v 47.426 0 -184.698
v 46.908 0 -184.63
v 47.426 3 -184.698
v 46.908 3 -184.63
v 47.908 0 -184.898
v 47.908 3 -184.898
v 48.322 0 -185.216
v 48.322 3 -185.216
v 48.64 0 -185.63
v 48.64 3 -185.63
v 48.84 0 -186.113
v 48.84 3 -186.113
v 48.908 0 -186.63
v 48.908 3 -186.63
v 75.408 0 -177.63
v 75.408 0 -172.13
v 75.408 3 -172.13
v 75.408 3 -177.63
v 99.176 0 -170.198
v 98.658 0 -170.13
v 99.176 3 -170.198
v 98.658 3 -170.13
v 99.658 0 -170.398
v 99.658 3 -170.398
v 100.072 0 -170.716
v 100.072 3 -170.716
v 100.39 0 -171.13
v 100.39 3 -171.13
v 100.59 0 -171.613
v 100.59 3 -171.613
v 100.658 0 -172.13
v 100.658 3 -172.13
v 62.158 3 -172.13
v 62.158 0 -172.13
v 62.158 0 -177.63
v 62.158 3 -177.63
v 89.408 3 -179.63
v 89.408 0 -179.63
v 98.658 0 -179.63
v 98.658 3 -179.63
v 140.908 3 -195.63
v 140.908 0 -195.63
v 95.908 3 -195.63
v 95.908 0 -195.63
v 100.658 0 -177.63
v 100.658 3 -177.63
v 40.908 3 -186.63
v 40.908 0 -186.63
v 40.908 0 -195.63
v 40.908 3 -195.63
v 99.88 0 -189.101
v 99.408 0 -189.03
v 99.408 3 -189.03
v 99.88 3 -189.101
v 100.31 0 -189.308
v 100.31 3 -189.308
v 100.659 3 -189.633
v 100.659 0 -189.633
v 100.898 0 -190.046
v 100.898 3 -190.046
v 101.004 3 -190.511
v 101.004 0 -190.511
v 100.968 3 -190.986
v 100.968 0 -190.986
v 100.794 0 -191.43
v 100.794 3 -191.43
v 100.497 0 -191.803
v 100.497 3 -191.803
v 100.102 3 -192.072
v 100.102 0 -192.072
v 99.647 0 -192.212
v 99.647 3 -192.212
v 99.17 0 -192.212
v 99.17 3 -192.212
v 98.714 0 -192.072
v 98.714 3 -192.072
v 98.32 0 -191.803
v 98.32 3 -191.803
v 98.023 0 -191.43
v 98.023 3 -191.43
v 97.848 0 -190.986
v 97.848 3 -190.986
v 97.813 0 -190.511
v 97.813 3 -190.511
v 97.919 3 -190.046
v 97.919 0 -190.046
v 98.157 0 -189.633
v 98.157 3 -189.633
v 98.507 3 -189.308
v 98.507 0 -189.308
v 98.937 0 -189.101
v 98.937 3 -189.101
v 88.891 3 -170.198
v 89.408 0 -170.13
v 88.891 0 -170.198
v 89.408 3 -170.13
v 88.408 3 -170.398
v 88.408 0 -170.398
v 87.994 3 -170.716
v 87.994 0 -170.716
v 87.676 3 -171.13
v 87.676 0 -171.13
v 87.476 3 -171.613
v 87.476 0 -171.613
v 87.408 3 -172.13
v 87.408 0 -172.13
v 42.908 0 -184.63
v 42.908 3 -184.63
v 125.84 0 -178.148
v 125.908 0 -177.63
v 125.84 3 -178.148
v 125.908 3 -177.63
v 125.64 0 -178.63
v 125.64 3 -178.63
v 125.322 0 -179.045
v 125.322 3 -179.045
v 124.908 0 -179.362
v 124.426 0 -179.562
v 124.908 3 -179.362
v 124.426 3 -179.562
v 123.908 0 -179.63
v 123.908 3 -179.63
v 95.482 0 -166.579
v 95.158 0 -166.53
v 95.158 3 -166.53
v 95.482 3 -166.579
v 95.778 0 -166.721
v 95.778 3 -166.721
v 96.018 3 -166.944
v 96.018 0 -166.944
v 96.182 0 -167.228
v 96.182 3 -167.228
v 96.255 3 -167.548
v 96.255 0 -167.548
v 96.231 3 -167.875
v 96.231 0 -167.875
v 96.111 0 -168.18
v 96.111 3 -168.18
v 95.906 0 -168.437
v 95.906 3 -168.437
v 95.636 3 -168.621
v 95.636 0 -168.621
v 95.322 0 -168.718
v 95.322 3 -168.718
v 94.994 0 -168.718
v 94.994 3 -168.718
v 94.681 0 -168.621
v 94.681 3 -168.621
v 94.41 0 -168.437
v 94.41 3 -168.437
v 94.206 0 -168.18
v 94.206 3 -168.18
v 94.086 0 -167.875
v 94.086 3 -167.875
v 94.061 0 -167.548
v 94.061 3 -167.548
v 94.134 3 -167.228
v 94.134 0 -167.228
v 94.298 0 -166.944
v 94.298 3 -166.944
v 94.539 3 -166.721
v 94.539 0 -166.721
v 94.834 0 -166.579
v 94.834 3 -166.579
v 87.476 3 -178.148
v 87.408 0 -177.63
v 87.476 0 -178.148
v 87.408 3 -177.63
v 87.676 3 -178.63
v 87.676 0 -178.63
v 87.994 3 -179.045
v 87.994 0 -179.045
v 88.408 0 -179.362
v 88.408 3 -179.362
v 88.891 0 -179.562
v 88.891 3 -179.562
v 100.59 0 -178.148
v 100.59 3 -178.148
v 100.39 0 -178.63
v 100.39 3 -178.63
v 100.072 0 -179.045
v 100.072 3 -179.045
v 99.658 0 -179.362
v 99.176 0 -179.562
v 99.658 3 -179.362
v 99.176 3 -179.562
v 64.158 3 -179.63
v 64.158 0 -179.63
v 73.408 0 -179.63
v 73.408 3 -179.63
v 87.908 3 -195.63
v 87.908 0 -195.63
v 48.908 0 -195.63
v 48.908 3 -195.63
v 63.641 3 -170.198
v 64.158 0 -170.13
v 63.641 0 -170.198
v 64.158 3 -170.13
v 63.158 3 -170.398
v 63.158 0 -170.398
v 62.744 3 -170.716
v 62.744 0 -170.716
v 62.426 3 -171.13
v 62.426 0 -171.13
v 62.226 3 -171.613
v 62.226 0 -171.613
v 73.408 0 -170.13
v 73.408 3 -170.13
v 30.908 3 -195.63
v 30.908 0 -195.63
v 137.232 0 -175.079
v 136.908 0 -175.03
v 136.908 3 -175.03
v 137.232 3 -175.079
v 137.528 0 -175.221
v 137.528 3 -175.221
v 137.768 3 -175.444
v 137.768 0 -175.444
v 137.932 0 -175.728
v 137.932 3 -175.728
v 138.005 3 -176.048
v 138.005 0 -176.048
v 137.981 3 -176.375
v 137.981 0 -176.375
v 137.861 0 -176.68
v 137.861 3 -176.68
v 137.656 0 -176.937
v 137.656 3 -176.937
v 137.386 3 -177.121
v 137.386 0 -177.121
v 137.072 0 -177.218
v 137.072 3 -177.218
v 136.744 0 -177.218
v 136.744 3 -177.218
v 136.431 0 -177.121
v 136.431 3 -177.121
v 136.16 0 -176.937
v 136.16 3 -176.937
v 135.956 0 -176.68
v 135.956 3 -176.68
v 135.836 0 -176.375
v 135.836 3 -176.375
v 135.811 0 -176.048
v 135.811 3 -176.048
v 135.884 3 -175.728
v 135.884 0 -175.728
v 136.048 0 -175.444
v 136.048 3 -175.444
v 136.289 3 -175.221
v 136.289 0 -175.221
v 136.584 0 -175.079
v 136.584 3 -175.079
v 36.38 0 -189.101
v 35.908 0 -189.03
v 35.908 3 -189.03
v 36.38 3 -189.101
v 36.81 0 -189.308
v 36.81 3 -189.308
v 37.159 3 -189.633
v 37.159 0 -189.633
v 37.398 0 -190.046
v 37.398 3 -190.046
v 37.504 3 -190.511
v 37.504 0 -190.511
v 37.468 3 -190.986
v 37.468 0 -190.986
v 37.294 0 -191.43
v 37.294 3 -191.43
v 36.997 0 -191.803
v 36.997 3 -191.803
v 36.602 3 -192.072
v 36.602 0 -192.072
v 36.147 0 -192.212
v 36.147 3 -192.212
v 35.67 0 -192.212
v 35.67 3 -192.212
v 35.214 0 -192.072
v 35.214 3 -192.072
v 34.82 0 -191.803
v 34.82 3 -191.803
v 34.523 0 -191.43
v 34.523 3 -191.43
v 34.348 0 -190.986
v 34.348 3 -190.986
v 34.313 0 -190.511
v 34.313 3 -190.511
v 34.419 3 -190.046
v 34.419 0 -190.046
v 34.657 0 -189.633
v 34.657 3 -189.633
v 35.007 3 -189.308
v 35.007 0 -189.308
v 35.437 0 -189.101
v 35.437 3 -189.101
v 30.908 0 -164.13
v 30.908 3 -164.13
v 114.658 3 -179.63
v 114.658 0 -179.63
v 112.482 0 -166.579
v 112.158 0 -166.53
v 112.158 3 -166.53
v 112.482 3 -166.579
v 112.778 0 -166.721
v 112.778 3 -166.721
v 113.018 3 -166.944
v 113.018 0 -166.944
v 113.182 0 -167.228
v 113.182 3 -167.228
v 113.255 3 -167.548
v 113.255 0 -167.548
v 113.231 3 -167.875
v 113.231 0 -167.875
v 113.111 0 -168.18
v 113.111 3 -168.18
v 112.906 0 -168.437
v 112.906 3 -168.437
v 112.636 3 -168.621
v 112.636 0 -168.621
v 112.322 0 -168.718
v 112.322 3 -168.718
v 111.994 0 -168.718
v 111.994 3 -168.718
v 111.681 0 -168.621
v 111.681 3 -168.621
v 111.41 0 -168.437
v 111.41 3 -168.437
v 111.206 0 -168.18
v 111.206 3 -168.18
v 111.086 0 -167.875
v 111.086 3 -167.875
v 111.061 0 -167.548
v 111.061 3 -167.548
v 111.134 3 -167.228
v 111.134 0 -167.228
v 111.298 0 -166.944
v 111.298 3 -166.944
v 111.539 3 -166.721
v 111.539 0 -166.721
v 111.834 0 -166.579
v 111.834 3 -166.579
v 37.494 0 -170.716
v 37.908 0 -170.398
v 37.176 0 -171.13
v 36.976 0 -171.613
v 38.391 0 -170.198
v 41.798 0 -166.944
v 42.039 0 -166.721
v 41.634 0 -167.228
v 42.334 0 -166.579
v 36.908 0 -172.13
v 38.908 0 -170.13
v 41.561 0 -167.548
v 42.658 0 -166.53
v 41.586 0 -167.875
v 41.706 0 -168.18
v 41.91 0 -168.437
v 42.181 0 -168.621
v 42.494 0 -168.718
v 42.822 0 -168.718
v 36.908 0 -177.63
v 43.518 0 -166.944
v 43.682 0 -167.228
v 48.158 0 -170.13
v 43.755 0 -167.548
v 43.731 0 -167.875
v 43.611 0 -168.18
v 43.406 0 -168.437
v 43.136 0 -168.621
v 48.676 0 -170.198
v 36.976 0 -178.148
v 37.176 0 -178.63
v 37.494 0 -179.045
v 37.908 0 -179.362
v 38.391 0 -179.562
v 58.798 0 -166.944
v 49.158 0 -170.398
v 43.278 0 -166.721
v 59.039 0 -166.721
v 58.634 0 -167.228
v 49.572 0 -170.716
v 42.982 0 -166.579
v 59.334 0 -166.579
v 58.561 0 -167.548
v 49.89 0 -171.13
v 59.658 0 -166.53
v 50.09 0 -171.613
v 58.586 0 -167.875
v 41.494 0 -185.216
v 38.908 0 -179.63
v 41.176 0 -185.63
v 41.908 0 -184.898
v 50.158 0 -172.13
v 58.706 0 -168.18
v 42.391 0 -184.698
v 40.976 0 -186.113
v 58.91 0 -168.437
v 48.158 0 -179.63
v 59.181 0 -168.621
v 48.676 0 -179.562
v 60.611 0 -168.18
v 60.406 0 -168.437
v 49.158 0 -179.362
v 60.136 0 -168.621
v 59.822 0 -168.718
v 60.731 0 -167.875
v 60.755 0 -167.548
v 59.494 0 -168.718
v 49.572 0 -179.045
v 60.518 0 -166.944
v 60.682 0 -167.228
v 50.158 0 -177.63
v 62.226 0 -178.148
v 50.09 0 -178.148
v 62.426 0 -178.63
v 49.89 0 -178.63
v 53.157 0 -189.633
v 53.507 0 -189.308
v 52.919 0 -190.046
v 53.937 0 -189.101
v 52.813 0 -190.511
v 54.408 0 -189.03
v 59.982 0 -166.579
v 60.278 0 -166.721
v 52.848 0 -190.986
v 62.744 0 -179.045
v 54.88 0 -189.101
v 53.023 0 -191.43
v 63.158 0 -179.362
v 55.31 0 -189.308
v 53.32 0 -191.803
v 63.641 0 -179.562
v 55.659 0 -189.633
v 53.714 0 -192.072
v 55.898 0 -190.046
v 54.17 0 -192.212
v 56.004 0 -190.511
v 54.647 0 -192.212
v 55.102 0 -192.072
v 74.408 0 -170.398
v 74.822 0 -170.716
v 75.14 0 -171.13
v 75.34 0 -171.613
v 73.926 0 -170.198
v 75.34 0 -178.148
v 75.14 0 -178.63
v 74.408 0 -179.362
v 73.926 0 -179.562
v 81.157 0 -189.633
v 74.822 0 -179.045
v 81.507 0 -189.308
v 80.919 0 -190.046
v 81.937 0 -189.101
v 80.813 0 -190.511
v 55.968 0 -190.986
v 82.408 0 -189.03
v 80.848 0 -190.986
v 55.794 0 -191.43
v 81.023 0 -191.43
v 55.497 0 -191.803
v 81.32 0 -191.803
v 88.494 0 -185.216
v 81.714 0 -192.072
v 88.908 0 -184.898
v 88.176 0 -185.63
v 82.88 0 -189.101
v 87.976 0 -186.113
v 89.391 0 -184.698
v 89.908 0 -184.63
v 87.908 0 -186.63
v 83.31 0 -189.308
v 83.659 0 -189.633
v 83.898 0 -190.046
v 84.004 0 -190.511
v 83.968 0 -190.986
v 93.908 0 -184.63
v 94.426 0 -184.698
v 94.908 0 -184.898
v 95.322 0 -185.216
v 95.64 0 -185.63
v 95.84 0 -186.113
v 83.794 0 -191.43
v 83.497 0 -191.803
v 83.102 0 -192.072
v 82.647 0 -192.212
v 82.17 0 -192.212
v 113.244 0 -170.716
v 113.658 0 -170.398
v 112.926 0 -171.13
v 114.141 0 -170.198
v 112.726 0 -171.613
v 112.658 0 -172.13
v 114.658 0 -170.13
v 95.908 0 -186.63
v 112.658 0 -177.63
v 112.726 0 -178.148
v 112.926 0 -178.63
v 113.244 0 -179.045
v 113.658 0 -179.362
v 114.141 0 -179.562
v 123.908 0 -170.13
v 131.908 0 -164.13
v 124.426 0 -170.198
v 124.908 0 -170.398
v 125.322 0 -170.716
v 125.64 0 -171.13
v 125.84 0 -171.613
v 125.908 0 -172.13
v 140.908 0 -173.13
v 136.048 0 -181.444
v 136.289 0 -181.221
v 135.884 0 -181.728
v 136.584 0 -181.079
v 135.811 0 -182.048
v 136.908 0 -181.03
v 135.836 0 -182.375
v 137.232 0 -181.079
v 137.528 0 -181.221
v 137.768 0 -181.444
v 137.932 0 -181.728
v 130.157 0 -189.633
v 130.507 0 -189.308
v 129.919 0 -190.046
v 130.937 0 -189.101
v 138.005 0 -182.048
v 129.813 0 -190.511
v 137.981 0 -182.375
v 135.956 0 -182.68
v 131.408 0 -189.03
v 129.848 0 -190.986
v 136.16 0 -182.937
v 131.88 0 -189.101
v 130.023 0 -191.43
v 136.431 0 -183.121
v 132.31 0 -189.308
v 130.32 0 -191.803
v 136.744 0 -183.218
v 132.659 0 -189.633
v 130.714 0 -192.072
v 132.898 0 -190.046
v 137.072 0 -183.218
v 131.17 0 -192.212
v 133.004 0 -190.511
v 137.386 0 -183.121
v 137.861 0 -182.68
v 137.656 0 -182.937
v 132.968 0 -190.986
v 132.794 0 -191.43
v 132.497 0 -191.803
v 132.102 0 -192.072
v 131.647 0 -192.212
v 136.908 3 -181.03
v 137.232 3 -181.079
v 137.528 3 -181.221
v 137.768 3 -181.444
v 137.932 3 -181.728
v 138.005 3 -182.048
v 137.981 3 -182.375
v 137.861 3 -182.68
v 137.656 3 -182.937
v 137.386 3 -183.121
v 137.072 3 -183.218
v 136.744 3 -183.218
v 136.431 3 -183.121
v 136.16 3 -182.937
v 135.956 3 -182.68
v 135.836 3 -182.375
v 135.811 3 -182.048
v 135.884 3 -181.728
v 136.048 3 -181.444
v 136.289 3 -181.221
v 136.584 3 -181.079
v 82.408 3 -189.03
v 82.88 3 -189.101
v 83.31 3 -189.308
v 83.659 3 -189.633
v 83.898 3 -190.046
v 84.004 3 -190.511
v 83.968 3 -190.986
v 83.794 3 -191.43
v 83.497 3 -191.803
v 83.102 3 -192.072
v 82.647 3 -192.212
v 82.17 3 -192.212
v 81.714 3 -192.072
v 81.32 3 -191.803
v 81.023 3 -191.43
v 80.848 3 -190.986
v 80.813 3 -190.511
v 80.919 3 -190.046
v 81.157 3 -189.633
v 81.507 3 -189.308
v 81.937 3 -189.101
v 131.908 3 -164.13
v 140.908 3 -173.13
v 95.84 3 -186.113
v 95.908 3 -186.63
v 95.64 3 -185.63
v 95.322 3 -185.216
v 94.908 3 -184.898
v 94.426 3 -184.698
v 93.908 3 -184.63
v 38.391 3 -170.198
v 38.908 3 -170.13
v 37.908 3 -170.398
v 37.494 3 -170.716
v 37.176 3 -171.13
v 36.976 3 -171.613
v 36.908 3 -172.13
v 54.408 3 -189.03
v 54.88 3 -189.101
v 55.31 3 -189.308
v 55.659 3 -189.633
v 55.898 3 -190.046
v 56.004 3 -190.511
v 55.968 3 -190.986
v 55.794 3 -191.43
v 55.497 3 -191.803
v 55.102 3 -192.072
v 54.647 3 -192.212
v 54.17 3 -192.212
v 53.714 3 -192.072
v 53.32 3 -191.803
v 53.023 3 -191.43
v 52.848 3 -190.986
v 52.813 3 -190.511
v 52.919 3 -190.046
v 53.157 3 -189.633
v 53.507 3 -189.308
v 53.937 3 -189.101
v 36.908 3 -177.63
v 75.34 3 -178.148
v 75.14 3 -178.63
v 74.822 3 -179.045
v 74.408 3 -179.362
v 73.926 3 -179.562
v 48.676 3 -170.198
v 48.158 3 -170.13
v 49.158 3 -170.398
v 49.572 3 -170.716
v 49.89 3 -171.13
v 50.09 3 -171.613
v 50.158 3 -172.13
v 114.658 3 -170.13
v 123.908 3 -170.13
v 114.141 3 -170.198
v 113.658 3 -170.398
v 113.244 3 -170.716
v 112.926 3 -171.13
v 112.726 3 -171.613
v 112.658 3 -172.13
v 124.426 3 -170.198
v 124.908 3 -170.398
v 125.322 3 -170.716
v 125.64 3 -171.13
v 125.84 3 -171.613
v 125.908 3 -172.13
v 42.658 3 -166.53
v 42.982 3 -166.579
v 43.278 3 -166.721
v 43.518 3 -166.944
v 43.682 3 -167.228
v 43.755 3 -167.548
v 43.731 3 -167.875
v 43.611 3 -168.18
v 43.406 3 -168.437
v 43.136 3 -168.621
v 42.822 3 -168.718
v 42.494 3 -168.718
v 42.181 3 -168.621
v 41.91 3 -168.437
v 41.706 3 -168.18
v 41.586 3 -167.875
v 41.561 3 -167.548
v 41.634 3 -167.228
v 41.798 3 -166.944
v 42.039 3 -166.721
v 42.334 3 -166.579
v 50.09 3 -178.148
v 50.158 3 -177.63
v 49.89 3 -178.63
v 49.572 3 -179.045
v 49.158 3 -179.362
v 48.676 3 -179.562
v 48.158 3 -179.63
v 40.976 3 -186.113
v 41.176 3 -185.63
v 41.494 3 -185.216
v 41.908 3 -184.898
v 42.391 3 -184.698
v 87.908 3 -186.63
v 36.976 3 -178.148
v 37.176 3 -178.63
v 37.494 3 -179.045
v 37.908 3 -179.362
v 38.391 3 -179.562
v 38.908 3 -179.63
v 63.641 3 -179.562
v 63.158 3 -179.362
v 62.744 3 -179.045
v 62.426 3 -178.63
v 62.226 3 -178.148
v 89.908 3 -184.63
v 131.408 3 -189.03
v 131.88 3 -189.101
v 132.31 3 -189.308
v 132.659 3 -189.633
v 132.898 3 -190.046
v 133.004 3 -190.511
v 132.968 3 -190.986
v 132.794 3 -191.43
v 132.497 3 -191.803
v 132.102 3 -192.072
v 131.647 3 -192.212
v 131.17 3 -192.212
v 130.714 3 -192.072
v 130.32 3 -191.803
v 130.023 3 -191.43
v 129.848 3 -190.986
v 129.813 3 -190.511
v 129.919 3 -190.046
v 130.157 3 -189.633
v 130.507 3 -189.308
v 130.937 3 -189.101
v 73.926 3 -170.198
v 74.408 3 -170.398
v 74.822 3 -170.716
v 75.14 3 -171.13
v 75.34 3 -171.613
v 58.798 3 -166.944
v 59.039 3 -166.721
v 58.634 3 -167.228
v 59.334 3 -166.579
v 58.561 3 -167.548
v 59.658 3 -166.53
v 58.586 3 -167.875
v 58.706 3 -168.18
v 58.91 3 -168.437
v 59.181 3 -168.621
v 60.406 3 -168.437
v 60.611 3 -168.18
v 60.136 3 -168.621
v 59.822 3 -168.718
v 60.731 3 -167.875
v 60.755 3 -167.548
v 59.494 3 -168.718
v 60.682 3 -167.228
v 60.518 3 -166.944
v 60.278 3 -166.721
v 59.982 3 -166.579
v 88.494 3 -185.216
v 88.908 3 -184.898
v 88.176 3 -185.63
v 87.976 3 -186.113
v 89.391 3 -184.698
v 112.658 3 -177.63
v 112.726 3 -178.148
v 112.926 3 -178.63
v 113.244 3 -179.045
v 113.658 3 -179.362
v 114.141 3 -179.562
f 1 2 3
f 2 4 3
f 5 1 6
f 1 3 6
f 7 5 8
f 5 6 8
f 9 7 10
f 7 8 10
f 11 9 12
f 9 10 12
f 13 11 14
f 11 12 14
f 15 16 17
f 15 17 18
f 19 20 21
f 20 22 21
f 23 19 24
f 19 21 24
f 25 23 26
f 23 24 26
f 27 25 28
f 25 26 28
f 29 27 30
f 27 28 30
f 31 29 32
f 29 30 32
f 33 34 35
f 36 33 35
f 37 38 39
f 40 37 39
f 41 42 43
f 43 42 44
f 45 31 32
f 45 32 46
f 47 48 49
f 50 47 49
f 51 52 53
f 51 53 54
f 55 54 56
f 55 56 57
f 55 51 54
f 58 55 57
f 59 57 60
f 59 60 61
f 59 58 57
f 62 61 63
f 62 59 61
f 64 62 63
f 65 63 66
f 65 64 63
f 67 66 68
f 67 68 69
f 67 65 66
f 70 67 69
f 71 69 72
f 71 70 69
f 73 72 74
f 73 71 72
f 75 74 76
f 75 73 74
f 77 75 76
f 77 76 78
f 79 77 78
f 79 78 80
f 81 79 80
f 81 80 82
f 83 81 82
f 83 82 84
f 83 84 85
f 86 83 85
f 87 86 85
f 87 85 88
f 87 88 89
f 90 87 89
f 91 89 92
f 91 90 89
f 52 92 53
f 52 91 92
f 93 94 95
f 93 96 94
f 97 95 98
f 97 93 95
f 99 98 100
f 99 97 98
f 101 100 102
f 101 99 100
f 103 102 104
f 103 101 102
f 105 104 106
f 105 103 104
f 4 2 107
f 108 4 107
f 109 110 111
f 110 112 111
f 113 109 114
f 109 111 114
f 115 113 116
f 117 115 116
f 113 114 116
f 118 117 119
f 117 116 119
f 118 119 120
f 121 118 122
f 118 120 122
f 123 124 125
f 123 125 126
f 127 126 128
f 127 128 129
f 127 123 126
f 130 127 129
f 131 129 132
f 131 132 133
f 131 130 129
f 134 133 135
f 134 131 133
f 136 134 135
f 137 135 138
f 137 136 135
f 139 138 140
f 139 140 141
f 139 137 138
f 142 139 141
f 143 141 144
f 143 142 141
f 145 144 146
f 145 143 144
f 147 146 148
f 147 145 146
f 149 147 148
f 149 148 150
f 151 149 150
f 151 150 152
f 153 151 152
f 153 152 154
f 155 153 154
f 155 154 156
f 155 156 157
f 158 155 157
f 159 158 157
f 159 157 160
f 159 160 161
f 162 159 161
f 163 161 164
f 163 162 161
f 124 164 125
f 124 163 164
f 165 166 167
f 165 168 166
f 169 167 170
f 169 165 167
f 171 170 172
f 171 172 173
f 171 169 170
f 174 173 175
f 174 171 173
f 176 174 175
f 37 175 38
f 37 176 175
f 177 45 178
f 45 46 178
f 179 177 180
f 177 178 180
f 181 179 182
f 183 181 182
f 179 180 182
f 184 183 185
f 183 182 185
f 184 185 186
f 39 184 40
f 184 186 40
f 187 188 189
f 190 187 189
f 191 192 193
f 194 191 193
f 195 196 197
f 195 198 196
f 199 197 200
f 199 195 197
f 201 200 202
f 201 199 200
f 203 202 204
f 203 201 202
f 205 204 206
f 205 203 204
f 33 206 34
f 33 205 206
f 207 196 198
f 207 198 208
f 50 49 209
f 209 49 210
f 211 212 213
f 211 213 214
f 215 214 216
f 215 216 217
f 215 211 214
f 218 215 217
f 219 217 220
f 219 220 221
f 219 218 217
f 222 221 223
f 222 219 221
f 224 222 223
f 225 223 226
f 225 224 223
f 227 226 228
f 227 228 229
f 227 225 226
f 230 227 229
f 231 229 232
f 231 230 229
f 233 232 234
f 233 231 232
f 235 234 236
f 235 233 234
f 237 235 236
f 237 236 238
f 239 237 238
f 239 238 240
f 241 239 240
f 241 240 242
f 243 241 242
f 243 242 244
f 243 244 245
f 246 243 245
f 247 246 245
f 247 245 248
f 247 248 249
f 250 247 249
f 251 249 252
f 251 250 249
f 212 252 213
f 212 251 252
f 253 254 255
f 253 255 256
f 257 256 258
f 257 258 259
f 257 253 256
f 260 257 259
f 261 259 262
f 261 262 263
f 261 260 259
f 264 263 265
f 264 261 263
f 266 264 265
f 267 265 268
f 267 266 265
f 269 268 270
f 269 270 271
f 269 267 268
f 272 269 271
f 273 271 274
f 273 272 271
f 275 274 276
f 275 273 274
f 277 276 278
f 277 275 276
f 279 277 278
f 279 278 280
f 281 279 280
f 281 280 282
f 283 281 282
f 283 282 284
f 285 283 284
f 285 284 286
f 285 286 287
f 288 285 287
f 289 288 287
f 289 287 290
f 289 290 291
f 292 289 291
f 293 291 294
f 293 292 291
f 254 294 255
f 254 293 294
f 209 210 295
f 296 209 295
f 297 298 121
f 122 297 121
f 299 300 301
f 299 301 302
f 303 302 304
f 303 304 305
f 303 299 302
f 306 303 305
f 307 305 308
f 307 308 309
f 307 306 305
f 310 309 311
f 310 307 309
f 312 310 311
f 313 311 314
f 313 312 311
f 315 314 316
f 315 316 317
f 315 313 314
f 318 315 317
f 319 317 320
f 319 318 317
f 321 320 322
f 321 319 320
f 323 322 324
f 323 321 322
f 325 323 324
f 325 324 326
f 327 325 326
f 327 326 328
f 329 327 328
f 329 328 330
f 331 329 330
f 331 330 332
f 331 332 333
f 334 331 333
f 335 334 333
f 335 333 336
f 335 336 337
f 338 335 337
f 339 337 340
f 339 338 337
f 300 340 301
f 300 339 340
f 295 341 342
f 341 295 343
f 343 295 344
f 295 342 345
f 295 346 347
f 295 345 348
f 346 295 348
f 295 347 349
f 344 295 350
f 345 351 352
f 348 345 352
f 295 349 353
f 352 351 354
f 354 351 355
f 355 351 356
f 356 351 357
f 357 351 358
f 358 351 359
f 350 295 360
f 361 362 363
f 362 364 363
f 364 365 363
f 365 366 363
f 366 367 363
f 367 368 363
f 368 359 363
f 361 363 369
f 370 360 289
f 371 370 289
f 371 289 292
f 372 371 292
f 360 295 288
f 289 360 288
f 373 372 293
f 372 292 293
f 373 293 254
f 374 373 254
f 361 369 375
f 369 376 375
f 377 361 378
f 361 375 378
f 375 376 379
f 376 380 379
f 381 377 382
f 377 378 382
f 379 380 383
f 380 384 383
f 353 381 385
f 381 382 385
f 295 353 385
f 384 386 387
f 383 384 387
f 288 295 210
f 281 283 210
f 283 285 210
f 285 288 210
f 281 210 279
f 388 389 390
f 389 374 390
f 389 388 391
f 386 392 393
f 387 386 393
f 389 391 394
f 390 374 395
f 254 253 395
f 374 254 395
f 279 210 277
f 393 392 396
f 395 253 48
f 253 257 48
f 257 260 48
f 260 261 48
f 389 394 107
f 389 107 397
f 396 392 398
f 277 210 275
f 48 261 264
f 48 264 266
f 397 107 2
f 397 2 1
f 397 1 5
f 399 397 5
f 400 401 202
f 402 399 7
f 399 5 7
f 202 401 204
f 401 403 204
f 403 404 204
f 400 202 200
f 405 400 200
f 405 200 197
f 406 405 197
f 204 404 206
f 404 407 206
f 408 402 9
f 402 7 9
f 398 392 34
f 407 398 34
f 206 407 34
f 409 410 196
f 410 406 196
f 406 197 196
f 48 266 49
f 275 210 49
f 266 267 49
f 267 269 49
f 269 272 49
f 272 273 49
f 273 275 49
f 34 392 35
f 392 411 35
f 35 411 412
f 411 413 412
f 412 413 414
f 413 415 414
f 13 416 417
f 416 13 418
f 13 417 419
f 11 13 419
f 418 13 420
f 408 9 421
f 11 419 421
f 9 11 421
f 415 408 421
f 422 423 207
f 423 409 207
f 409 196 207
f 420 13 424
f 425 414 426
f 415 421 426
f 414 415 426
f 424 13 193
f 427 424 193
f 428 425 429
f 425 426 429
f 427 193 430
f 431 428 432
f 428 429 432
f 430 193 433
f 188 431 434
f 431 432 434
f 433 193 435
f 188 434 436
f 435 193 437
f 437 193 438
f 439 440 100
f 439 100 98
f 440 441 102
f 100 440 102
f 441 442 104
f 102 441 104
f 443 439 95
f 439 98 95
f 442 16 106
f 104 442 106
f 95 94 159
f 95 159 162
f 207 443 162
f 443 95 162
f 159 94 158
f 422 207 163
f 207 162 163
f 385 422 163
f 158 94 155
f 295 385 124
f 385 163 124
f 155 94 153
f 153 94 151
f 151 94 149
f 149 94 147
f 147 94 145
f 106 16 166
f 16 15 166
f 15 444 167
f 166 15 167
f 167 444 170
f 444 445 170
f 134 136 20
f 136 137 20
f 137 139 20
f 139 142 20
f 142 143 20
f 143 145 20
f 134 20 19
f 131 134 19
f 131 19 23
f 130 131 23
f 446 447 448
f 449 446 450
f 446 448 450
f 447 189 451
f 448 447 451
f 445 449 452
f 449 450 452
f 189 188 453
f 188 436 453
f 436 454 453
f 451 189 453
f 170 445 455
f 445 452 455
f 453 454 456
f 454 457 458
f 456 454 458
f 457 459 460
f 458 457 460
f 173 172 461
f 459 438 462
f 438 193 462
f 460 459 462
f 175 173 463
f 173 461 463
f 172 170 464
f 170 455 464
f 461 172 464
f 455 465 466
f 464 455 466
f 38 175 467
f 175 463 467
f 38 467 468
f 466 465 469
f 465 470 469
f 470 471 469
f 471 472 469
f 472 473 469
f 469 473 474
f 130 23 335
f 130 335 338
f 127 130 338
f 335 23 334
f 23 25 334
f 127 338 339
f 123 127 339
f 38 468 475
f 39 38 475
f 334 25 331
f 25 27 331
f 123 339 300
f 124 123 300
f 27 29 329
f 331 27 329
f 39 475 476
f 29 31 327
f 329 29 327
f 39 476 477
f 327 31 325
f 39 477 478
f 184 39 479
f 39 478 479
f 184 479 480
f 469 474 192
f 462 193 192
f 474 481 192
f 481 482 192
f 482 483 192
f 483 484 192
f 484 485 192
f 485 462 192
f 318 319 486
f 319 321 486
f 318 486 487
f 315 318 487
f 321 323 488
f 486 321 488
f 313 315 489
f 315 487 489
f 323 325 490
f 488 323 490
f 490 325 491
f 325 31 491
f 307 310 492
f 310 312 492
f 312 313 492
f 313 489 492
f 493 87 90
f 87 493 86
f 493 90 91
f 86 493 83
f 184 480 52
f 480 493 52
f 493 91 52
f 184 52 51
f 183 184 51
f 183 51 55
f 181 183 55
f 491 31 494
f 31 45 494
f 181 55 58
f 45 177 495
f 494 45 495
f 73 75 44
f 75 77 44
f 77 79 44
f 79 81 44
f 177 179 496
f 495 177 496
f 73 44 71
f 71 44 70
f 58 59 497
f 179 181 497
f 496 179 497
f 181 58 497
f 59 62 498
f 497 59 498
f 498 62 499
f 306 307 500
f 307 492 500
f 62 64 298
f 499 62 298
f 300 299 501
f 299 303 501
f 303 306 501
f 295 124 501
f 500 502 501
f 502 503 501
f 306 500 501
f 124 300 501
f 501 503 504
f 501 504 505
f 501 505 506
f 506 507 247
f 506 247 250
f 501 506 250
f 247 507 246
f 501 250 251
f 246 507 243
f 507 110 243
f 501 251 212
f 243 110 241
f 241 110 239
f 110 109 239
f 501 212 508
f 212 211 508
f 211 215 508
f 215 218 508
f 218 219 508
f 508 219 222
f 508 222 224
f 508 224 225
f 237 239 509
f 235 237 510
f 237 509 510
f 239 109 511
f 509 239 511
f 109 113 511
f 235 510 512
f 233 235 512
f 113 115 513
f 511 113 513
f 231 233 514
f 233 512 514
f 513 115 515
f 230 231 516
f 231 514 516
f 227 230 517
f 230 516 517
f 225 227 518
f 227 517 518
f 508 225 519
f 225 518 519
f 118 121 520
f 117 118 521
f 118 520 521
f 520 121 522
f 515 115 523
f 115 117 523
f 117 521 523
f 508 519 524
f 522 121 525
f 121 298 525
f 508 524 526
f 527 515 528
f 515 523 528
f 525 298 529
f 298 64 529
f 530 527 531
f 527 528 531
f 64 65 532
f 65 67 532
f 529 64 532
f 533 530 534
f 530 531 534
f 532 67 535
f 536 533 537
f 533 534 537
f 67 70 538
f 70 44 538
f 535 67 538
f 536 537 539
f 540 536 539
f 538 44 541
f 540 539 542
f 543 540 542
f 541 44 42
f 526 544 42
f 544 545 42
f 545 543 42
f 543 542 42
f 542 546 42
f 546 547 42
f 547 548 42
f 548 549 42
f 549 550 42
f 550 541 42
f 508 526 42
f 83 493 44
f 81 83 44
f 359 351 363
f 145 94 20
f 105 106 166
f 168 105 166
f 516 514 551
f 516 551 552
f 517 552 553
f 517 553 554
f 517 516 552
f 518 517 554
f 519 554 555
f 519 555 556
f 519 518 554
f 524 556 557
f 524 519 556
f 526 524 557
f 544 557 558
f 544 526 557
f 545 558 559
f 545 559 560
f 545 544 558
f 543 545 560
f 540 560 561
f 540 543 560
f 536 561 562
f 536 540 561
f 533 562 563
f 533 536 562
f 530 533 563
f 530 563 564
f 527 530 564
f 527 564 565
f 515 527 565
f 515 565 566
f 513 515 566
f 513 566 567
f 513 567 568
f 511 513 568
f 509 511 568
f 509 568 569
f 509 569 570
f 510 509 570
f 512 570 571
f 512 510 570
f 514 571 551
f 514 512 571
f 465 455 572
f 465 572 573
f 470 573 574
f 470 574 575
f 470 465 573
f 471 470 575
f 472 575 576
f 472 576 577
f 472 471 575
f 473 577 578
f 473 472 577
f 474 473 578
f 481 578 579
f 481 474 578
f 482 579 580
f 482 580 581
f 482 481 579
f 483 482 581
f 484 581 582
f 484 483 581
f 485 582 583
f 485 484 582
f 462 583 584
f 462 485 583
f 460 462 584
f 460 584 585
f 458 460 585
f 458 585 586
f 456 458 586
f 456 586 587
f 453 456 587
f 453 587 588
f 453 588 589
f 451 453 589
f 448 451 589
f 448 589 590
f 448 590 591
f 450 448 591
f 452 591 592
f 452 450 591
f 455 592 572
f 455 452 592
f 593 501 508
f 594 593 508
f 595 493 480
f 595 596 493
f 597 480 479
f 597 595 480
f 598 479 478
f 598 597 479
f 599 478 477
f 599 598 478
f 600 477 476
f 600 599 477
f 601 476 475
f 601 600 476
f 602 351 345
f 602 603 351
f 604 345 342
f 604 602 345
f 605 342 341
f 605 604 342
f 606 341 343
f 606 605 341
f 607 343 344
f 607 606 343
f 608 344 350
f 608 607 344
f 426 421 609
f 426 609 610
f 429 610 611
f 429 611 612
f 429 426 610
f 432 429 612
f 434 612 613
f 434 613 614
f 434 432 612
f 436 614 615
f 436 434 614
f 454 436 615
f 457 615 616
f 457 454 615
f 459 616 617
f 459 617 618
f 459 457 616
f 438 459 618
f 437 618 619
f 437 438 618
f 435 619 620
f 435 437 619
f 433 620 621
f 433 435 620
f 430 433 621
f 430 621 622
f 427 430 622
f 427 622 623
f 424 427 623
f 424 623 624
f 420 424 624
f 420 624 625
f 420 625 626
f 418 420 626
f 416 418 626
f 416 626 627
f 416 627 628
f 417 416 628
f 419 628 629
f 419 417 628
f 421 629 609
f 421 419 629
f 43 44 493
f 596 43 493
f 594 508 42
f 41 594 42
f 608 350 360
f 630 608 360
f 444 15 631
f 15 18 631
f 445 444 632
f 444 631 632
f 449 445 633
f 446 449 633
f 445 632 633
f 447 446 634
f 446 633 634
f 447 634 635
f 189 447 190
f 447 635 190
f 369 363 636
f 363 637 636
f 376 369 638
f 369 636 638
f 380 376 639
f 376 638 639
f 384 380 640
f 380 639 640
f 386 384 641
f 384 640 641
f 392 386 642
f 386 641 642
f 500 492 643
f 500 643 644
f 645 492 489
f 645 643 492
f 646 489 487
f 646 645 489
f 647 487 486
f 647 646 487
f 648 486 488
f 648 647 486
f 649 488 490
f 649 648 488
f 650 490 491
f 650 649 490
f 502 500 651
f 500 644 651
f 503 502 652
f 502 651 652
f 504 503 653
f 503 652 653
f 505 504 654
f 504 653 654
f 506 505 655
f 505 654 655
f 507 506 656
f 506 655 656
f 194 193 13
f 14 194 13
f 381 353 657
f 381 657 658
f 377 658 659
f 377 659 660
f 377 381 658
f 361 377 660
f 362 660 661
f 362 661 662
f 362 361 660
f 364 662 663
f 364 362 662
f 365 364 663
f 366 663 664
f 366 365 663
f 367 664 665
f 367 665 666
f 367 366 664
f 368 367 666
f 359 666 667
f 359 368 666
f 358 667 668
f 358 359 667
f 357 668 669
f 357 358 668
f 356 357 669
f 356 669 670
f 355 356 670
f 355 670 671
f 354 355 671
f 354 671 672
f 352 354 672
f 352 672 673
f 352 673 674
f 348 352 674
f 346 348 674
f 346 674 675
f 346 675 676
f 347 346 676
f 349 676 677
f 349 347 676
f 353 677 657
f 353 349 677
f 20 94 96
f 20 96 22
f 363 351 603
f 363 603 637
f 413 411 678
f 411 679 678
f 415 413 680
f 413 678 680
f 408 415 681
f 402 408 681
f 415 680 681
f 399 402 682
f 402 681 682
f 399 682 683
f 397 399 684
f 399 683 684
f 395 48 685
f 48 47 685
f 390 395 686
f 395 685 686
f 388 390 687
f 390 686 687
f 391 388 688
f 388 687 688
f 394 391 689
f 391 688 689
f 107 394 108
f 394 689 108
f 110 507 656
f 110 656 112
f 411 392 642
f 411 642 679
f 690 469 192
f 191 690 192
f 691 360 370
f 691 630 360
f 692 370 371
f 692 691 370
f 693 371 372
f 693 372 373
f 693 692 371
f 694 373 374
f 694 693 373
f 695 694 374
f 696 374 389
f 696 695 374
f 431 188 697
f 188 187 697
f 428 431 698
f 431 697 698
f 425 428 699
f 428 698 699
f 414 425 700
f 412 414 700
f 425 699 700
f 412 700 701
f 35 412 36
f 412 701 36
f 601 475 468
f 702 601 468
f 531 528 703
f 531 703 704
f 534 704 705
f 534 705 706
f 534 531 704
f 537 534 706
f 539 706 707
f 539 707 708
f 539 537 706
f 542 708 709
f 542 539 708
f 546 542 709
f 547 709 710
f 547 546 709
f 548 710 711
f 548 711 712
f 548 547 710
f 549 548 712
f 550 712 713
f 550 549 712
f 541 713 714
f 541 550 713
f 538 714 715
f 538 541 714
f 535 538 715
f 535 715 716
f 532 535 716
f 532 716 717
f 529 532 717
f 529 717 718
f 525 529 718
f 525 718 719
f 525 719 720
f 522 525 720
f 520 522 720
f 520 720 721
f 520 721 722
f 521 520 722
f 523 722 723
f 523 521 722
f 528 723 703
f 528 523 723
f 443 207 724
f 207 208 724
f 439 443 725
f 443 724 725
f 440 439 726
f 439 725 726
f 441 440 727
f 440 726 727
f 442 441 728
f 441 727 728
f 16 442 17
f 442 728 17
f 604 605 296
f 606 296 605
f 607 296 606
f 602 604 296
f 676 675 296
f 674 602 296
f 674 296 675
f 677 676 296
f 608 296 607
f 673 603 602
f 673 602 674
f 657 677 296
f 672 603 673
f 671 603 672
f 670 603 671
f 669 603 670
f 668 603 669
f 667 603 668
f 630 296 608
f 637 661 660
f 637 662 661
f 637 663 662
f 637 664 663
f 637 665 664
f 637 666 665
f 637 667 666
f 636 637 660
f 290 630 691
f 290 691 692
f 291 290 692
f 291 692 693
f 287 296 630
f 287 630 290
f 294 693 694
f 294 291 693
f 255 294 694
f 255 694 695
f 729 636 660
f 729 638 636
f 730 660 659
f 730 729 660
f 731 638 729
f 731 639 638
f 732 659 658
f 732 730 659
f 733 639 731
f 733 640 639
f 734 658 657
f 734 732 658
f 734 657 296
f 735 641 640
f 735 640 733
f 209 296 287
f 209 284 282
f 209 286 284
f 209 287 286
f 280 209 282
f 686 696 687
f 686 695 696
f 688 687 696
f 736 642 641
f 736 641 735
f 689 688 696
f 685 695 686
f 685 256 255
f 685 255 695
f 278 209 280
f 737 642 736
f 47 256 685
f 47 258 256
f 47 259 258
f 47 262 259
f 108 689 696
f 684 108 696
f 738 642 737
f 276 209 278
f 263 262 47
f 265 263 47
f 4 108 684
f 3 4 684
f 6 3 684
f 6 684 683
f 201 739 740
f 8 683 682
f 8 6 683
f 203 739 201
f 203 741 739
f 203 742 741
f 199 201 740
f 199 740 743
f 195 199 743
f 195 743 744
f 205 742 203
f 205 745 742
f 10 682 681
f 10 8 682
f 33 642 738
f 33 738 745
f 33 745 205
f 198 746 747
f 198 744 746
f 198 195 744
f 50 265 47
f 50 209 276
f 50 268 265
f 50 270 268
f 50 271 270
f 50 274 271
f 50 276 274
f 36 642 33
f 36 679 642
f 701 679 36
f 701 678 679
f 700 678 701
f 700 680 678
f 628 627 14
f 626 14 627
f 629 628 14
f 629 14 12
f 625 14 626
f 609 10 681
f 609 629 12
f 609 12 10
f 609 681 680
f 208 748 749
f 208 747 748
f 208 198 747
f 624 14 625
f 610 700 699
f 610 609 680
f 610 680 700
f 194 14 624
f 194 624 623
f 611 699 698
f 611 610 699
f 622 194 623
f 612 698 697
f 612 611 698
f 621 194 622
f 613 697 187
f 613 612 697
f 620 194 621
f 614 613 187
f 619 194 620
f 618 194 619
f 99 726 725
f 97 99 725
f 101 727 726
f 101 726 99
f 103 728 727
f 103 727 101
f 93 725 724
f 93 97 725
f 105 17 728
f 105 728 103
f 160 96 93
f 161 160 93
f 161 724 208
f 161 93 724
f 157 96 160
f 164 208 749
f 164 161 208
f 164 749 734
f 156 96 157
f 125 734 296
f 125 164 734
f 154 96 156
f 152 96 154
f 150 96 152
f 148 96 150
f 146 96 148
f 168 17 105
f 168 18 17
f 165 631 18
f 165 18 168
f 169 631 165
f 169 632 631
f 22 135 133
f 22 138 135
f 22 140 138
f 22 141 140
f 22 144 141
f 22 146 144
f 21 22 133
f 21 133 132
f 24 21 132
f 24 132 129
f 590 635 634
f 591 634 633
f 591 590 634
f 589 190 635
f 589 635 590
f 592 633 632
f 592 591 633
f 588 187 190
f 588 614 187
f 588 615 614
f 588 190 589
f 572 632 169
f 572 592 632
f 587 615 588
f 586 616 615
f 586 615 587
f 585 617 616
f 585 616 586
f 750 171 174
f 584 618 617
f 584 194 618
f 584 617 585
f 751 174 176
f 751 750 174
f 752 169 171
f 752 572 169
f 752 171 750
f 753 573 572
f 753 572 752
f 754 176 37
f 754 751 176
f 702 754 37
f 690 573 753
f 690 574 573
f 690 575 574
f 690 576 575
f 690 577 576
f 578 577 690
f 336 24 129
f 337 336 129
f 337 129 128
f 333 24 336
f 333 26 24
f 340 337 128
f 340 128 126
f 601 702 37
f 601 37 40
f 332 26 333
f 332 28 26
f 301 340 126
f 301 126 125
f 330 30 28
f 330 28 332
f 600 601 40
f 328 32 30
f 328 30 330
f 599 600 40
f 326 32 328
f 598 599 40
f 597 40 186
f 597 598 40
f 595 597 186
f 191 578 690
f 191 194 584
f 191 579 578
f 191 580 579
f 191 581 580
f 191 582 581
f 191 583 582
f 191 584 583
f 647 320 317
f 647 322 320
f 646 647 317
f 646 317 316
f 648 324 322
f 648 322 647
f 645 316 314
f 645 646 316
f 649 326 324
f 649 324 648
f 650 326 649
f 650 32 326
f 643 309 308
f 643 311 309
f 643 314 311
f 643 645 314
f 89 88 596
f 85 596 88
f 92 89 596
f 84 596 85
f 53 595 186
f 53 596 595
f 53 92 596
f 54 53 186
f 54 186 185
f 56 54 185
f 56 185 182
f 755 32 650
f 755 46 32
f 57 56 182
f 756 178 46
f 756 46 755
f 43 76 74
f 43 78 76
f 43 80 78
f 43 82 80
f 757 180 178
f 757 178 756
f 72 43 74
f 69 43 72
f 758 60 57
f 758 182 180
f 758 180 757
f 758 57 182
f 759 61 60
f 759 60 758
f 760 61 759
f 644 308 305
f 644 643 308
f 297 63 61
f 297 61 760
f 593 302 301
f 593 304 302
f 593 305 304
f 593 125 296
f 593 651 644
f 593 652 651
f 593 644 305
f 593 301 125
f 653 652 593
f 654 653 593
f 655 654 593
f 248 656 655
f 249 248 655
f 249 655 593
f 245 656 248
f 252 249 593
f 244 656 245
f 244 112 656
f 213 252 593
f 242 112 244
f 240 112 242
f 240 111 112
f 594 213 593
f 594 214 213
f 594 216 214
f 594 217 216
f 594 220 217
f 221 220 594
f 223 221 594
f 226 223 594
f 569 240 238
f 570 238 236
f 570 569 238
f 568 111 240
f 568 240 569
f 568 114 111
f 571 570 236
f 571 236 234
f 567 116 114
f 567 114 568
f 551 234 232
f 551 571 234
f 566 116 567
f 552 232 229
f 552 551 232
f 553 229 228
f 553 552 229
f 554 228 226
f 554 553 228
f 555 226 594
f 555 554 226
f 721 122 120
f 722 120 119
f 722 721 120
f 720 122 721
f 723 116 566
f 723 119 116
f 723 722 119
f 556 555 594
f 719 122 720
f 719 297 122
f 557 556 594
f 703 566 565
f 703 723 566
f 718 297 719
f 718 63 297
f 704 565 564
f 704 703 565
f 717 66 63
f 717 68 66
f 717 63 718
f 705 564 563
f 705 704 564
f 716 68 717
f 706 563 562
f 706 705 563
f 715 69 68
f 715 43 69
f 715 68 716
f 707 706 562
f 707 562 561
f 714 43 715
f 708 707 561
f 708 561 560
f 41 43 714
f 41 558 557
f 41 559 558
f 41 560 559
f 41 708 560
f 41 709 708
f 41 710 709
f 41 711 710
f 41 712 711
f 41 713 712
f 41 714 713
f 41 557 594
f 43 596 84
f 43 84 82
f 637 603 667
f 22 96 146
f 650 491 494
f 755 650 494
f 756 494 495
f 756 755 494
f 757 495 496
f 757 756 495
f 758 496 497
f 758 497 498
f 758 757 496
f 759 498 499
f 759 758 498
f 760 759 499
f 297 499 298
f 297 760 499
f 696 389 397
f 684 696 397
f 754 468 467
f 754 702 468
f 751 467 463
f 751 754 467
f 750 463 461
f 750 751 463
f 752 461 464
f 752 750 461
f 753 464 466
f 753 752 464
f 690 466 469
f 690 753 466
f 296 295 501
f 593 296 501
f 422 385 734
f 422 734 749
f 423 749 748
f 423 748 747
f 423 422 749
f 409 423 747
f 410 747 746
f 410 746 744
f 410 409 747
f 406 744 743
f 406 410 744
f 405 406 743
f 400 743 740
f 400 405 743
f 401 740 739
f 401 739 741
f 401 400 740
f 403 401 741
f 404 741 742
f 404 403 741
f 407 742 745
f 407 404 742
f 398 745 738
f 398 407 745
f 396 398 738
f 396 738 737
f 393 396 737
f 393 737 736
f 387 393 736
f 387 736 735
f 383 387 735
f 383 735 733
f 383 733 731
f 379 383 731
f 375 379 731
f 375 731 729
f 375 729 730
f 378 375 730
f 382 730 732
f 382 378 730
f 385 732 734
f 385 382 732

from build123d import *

# Parameters (mm, degrees)
SKETCH1_R      = 1.6
SKETCH1_R_2    = 1.1
SKETCH1_W      = 13.25
SKETCH1_H      = 9.5
EXTRUDE1_DEPTH = 3
FILLET_1_R     = 2


with BuildPart() as part:
    # Sketch1 → Extrude1 (new body)
    with BuildSketch(Plane(origin=(0, 0, 0), x_dir=(1, 0, 0), z_dir=(0, 1, 0))):
        Polygon((30.90824759, 164.13031435), (131.90824759, 164.13031435), (140.90824759, 173.13031435), (140.90824759, 195.63031435), (95.90824759, 195.63031435), (95.90824759, 184.63031435), (87.90824759, 184.63031435), (87.90824759, 195.63031435), (48.90824759, 195.63031435), (48.90824759, 184.63031435), (40.90824759, 184.63031435), (40.90824759, 195.63031435), (30.90824759, 195.63031435), align=None)
        with Locations(Location((131.40824759, 190.63031435, 0), (0, 0, 270))):
            Circle(SKETCH1_R, mode=Mode.SUBTRACT)
        with Locations(Location((99.40824759, 190.63031435, 0), (0, 0, 270))):
            Circle(SKETCH1_R, mode=Mode.SUBTRACT)
        with Locations(Location((82.40824759, 190.63031435, 0), (0, 0, 270))):
            Circle(SKETCH1_R, mode=Mode.SUBTRACT)
        with Locations(Location((54.40824759, 190.63031435, 0), (0, 0, 270))):
            Circle(SKETCH1_R, mode=Mode.SUBTRACT)
        with Locations(Location((35.90824759, 190.63031435, 0), (0, 0, 270))):
            Circle(SKETCH1_R, mode=Mode.SUBTRACT)
        with Locations(Location((112.15824759, 167.63031435, 0), (0, 0, 270))):
            Circle(SKETCH1_R_2, mode=Mode.SUBTRACT)
        with Locations(Location((95.15824759, 167.63031435, 0), (0, 0, 270))):
            Circle(SKETCH1_R_2, mode=Mode.SUBTRACT)
        with Locations(Location((59.65824759, 167.63031435, 0), (0, 0, 270))):
            Circle(SKETCH1_R_2, mode=Mode.SUBTRACT)
        with Locations(Location((42.65824759, 167.63031435, 0), (0, 0, 270))):
            Circle(SKETCH1_R_2, mode=Mode.SUBTRACT)
        with Locations(Location((136.90824759, 176.13031435, 0), (0, 0, 270))):
            Circle(SKETCH1_R_2, mode=Mode.SUBTRACT)
        with Locations(Location((136.90824759, 182.13031435, 0), (0, 0, 270))):
            Circle(SKETCH1_R_2, mode=Mode.SUBTRACT)
        with Locations((119.28324759, 174.88031435)):
            Rectangle(SKETCH1_W, SKETCH1_H, mode=Mode.SUBTRACT)
        with Locations((94.03324759, 174.88031435)):
            Rectangle(SKETCH1_W, SKETCH1_H, mode=Mode.SUBTRACT)
        with Locations((43.53324759, 174.88031435)):
            Rectangle(SKETCH1_W, SKETCH1_H, mode=Mode.SUBTRACT)
        with Locations((68.78324759, 174.88031435)):
            Rectangle(SKETCH1_W, SKETCH1_H, mode=Mode.SUBTRACT)
    extrude(amount=EXTRUDE1_DEPTH)

    # 圆角1
    fillet_1_edges = [part.edges().sort_by_distance(p)[0] for p in [
        (36.90824759, 1.5, -170.13031435),
        (50.15824759, 1.5, -170.13031435),
        (50.15824759, 1.5, -179.63031435),
        (36.90824759, 1.5, -179.63031435),
        (62.15824759, 1.5, -170.13031435),
        (75.40824759, 1.5, -170.13031435),
        (75.40824759, 1.5, -179.63031435),
        (62.15824759, 1.5, -179.63031435),
        (40.90824759, 1.5, -184.63031435),
        (48.90824759, 1.5, -184.63031435),
        (87.90824759, 1.5, -184.63031435),
        (95.90824759, 1.5, -184.63031435),
        (112.65824759, 1.5, -179.63031435),
        (112.65824759, 1.5, -170.13031435),
        (125.90824759, 1.5, -170.13031435),
        (125.90824759, 1.5, -179.63031435),
        (87.40824759, 1.5, -179.63031435),
        (87.40824759, 1.5, -170.13031435),
        (100.65824759, 1.5, -170.13031435),
        (100.65824759, 1.5, -179.63031435),
    ]]
    fillet(fillet_1_edges, radius=FILLET_1_R)


solid = part.part
